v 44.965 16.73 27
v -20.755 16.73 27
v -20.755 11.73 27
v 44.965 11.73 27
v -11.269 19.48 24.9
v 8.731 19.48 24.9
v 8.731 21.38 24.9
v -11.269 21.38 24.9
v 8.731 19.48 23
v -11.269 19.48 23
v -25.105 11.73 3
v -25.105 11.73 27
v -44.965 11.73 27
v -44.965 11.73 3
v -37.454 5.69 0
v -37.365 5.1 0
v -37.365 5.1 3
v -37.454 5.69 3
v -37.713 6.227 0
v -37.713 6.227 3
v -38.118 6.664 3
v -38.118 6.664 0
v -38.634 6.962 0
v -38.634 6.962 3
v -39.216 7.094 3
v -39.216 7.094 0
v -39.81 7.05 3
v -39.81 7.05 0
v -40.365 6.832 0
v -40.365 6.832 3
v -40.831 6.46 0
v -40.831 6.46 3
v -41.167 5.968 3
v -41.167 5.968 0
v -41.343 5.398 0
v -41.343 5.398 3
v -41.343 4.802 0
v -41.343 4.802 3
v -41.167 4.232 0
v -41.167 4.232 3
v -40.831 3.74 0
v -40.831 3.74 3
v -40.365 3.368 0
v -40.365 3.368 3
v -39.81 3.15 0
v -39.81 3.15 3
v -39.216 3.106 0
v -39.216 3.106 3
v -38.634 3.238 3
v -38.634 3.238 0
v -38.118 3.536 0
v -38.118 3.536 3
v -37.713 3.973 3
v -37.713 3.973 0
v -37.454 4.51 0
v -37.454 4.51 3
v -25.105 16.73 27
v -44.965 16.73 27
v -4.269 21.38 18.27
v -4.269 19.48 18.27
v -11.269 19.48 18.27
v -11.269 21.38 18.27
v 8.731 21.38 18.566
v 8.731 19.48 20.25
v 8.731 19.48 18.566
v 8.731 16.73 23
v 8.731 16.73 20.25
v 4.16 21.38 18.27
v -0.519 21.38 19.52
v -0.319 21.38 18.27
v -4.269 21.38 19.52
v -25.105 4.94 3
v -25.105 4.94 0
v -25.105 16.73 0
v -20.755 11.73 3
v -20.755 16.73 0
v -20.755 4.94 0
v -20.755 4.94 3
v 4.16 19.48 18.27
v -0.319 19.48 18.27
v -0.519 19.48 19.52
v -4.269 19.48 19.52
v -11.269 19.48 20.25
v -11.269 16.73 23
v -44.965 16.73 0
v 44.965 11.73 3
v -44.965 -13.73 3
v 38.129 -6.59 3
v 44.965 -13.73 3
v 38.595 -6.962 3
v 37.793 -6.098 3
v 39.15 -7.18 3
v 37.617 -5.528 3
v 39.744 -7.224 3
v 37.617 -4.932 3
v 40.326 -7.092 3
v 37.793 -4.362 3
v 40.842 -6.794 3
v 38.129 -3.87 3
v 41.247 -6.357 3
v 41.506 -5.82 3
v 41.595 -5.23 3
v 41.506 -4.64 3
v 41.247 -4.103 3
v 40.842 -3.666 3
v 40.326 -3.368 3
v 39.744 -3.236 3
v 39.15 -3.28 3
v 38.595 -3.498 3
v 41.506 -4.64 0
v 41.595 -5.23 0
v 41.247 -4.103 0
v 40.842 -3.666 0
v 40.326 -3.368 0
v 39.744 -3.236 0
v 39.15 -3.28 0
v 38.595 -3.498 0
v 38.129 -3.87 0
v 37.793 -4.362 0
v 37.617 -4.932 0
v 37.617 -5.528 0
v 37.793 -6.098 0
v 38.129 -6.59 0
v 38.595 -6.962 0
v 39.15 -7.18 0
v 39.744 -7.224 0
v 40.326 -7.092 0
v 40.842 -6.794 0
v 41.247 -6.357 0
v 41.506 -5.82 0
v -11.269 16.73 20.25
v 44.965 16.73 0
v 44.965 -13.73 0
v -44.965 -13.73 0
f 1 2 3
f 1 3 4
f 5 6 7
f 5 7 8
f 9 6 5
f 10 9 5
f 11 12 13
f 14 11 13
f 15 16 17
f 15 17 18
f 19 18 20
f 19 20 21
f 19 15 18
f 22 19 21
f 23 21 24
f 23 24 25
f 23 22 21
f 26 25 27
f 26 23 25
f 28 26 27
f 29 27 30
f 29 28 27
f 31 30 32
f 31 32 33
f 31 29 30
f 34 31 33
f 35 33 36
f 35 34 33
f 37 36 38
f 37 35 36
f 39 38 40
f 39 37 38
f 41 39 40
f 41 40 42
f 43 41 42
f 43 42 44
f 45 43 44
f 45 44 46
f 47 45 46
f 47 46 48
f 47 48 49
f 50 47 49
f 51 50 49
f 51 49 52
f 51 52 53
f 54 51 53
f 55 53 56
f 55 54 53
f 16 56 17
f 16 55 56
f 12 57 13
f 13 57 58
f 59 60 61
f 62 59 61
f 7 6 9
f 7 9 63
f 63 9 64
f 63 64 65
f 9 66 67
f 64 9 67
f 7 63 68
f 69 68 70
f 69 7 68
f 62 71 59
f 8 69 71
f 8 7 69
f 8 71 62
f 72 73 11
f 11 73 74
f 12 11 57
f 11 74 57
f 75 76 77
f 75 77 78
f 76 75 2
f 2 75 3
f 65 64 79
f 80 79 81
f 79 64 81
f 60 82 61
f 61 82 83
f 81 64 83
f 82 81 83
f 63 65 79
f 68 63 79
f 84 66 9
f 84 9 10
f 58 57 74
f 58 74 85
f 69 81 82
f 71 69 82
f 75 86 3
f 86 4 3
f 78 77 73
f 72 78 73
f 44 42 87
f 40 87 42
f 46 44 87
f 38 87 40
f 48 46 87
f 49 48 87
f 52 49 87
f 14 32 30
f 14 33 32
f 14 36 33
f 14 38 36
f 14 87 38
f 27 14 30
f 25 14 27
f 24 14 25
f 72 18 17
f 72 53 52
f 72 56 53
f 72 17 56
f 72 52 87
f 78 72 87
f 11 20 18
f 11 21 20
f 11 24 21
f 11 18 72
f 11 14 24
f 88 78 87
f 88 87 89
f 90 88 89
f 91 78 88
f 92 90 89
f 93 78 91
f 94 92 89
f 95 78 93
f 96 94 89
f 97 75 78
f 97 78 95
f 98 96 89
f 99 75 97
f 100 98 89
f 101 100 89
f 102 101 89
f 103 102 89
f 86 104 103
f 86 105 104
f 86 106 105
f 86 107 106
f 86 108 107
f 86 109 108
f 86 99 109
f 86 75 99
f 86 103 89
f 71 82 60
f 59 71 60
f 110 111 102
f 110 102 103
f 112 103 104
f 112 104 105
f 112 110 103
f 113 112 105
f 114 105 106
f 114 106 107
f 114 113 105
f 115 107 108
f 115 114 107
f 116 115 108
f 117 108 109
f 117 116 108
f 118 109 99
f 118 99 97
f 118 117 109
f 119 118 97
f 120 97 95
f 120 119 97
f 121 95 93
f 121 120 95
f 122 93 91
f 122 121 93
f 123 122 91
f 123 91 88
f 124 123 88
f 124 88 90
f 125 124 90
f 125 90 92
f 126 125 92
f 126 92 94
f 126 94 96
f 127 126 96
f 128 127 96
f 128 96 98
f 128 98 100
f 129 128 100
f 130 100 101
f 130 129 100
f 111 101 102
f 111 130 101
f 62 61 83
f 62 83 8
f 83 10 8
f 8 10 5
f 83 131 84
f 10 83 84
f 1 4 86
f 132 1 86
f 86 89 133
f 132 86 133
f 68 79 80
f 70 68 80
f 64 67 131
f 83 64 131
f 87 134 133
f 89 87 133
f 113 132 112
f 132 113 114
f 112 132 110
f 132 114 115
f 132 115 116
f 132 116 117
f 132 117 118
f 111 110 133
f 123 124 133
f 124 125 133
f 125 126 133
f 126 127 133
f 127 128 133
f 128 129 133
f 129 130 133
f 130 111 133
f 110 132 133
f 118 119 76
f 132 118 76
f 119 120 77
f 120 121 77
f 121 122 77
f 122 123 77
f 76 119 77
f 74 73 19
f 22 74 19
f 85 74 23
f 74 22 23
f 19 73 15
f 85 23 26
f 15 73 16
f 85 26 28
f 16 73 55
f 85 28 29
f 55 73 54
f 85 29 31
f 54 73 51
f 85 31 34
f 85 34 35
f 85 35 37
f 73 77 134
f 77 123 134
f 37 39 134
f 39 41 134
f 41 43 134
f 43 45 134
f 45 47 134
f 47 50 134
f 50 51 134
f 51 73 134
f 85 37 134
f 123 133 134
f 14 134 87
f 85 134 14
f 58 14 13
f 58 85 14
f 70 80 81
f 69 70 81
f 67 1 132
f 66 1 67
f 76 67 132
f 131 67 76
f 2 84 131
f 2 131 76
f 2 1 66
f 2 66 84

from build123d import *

# Parameters (mm, degrees)
F0_R     = 2
F1_DEPTH = 3
F2_W     = 19.86
F2_H     = 24
F2_H_2   = 3
F3_DEPTH = 3
F4_W     = 20
F4_H     = 2.75
F5_DEPTH = 2.75
F6_W     = 20
F6_H     = 1.9
F7_DEPTH = 1.9
F8_DEPTH = 2


with BuildPart() as f1:
    # F0 (on Top) → F1 (new body)
    with BuildSketch(Plane.XY):
        Polygon((-44.965, -13.73), (44.965, -13.73), (44.965, 13.73), (-20.755, 13.73), (-20.755, 4.94), (-25.105, 4.94), (-25.105, 13.73), (-44.965, 13.73), align=None)
        with Locations((39.595, -5.23)):
            Circle(F0_R, mode=Mode.SUBTRACT)
        with Locations((-39.365, 5.1)):
            Circle(F0_R, mode=Mode.SUBTRACT)
    extrude(amount=F1_DEPTH)

    # F2 (on face) → F3 (join)
    with BuildSketch(Plane(origin=(0, 13.73, 0), x_dir=(-1, 0, 0), z_dir=(0, 1, 0))):
        Polygon((11.269, 0), (20.755, 0), (20.755, 3), (20.755, 27), (-44.965, 27), (-44.965, 3), (-44.965, 0), (-8.731, 0), align=None)
        with Locations((35.035, 15)):
            Rectangle(F2_W, F2_H)
        with Locations((35.035, 1.5)):
            Rectangle(F2_W, F2_H_2)
    extrude(amount=F3_DEPTH)

    # F4 (on face) → F5 (join)
    with BuildSketch(Plane(origin=(0, 16.73, 0), x_dir=(-1, 0, 0), z_dir=(0, 1, 0))):
        with Locations((1.269, 21.625)):
            Rectangle(F4_W, F4_H)
    extrude(amount=F5_DEPTH)

    # F6 (on face) → F7 (join)
    with BuildSketch(Plane(origin=(0, 19.48, 0), x_dir=(-1, 0, 0), z_dir=(0, 1, 0))):
        Polygon((11.269, 20.25), (-8.731, 20.25), (-8.731, 18.5663476586), (-4.159652628, 18.27), (0.319, 18.27), (0.519, 19.52), (4.269, 19.52), (4.269, 18.27), (11.269, 18.27), align=None)
        Polygon((-8.731, 23), (-8.731, 20.25), (11.269, 20.25), (11.269, 21.625), (11.269, 23), align=None)
        with Locations((1.269, 23.95)):
            Rectangle(F6_W, F6_H)
    extrude(amount=F7_DEPTH)

    # F2 (on face) → F8 (join)
    with BuildSketch(Plane(origin=(0, 13.73, 0), x_dir=(-1, 0, 0), z_dir=(0, 1, 0))):
        with Locations((35.035, 15)):
            Rectangle(F2_W, F2_H)
        Polygon((11.269, 0), (20.755, 0), (20.755, 3), (20.755, 27), (-44.965, 27), (-44.965, 3), (-44.965, 0), (-8.731, 0), align=None)
    extrude(amount=-F8_DEPTH)


solid = f1.part
